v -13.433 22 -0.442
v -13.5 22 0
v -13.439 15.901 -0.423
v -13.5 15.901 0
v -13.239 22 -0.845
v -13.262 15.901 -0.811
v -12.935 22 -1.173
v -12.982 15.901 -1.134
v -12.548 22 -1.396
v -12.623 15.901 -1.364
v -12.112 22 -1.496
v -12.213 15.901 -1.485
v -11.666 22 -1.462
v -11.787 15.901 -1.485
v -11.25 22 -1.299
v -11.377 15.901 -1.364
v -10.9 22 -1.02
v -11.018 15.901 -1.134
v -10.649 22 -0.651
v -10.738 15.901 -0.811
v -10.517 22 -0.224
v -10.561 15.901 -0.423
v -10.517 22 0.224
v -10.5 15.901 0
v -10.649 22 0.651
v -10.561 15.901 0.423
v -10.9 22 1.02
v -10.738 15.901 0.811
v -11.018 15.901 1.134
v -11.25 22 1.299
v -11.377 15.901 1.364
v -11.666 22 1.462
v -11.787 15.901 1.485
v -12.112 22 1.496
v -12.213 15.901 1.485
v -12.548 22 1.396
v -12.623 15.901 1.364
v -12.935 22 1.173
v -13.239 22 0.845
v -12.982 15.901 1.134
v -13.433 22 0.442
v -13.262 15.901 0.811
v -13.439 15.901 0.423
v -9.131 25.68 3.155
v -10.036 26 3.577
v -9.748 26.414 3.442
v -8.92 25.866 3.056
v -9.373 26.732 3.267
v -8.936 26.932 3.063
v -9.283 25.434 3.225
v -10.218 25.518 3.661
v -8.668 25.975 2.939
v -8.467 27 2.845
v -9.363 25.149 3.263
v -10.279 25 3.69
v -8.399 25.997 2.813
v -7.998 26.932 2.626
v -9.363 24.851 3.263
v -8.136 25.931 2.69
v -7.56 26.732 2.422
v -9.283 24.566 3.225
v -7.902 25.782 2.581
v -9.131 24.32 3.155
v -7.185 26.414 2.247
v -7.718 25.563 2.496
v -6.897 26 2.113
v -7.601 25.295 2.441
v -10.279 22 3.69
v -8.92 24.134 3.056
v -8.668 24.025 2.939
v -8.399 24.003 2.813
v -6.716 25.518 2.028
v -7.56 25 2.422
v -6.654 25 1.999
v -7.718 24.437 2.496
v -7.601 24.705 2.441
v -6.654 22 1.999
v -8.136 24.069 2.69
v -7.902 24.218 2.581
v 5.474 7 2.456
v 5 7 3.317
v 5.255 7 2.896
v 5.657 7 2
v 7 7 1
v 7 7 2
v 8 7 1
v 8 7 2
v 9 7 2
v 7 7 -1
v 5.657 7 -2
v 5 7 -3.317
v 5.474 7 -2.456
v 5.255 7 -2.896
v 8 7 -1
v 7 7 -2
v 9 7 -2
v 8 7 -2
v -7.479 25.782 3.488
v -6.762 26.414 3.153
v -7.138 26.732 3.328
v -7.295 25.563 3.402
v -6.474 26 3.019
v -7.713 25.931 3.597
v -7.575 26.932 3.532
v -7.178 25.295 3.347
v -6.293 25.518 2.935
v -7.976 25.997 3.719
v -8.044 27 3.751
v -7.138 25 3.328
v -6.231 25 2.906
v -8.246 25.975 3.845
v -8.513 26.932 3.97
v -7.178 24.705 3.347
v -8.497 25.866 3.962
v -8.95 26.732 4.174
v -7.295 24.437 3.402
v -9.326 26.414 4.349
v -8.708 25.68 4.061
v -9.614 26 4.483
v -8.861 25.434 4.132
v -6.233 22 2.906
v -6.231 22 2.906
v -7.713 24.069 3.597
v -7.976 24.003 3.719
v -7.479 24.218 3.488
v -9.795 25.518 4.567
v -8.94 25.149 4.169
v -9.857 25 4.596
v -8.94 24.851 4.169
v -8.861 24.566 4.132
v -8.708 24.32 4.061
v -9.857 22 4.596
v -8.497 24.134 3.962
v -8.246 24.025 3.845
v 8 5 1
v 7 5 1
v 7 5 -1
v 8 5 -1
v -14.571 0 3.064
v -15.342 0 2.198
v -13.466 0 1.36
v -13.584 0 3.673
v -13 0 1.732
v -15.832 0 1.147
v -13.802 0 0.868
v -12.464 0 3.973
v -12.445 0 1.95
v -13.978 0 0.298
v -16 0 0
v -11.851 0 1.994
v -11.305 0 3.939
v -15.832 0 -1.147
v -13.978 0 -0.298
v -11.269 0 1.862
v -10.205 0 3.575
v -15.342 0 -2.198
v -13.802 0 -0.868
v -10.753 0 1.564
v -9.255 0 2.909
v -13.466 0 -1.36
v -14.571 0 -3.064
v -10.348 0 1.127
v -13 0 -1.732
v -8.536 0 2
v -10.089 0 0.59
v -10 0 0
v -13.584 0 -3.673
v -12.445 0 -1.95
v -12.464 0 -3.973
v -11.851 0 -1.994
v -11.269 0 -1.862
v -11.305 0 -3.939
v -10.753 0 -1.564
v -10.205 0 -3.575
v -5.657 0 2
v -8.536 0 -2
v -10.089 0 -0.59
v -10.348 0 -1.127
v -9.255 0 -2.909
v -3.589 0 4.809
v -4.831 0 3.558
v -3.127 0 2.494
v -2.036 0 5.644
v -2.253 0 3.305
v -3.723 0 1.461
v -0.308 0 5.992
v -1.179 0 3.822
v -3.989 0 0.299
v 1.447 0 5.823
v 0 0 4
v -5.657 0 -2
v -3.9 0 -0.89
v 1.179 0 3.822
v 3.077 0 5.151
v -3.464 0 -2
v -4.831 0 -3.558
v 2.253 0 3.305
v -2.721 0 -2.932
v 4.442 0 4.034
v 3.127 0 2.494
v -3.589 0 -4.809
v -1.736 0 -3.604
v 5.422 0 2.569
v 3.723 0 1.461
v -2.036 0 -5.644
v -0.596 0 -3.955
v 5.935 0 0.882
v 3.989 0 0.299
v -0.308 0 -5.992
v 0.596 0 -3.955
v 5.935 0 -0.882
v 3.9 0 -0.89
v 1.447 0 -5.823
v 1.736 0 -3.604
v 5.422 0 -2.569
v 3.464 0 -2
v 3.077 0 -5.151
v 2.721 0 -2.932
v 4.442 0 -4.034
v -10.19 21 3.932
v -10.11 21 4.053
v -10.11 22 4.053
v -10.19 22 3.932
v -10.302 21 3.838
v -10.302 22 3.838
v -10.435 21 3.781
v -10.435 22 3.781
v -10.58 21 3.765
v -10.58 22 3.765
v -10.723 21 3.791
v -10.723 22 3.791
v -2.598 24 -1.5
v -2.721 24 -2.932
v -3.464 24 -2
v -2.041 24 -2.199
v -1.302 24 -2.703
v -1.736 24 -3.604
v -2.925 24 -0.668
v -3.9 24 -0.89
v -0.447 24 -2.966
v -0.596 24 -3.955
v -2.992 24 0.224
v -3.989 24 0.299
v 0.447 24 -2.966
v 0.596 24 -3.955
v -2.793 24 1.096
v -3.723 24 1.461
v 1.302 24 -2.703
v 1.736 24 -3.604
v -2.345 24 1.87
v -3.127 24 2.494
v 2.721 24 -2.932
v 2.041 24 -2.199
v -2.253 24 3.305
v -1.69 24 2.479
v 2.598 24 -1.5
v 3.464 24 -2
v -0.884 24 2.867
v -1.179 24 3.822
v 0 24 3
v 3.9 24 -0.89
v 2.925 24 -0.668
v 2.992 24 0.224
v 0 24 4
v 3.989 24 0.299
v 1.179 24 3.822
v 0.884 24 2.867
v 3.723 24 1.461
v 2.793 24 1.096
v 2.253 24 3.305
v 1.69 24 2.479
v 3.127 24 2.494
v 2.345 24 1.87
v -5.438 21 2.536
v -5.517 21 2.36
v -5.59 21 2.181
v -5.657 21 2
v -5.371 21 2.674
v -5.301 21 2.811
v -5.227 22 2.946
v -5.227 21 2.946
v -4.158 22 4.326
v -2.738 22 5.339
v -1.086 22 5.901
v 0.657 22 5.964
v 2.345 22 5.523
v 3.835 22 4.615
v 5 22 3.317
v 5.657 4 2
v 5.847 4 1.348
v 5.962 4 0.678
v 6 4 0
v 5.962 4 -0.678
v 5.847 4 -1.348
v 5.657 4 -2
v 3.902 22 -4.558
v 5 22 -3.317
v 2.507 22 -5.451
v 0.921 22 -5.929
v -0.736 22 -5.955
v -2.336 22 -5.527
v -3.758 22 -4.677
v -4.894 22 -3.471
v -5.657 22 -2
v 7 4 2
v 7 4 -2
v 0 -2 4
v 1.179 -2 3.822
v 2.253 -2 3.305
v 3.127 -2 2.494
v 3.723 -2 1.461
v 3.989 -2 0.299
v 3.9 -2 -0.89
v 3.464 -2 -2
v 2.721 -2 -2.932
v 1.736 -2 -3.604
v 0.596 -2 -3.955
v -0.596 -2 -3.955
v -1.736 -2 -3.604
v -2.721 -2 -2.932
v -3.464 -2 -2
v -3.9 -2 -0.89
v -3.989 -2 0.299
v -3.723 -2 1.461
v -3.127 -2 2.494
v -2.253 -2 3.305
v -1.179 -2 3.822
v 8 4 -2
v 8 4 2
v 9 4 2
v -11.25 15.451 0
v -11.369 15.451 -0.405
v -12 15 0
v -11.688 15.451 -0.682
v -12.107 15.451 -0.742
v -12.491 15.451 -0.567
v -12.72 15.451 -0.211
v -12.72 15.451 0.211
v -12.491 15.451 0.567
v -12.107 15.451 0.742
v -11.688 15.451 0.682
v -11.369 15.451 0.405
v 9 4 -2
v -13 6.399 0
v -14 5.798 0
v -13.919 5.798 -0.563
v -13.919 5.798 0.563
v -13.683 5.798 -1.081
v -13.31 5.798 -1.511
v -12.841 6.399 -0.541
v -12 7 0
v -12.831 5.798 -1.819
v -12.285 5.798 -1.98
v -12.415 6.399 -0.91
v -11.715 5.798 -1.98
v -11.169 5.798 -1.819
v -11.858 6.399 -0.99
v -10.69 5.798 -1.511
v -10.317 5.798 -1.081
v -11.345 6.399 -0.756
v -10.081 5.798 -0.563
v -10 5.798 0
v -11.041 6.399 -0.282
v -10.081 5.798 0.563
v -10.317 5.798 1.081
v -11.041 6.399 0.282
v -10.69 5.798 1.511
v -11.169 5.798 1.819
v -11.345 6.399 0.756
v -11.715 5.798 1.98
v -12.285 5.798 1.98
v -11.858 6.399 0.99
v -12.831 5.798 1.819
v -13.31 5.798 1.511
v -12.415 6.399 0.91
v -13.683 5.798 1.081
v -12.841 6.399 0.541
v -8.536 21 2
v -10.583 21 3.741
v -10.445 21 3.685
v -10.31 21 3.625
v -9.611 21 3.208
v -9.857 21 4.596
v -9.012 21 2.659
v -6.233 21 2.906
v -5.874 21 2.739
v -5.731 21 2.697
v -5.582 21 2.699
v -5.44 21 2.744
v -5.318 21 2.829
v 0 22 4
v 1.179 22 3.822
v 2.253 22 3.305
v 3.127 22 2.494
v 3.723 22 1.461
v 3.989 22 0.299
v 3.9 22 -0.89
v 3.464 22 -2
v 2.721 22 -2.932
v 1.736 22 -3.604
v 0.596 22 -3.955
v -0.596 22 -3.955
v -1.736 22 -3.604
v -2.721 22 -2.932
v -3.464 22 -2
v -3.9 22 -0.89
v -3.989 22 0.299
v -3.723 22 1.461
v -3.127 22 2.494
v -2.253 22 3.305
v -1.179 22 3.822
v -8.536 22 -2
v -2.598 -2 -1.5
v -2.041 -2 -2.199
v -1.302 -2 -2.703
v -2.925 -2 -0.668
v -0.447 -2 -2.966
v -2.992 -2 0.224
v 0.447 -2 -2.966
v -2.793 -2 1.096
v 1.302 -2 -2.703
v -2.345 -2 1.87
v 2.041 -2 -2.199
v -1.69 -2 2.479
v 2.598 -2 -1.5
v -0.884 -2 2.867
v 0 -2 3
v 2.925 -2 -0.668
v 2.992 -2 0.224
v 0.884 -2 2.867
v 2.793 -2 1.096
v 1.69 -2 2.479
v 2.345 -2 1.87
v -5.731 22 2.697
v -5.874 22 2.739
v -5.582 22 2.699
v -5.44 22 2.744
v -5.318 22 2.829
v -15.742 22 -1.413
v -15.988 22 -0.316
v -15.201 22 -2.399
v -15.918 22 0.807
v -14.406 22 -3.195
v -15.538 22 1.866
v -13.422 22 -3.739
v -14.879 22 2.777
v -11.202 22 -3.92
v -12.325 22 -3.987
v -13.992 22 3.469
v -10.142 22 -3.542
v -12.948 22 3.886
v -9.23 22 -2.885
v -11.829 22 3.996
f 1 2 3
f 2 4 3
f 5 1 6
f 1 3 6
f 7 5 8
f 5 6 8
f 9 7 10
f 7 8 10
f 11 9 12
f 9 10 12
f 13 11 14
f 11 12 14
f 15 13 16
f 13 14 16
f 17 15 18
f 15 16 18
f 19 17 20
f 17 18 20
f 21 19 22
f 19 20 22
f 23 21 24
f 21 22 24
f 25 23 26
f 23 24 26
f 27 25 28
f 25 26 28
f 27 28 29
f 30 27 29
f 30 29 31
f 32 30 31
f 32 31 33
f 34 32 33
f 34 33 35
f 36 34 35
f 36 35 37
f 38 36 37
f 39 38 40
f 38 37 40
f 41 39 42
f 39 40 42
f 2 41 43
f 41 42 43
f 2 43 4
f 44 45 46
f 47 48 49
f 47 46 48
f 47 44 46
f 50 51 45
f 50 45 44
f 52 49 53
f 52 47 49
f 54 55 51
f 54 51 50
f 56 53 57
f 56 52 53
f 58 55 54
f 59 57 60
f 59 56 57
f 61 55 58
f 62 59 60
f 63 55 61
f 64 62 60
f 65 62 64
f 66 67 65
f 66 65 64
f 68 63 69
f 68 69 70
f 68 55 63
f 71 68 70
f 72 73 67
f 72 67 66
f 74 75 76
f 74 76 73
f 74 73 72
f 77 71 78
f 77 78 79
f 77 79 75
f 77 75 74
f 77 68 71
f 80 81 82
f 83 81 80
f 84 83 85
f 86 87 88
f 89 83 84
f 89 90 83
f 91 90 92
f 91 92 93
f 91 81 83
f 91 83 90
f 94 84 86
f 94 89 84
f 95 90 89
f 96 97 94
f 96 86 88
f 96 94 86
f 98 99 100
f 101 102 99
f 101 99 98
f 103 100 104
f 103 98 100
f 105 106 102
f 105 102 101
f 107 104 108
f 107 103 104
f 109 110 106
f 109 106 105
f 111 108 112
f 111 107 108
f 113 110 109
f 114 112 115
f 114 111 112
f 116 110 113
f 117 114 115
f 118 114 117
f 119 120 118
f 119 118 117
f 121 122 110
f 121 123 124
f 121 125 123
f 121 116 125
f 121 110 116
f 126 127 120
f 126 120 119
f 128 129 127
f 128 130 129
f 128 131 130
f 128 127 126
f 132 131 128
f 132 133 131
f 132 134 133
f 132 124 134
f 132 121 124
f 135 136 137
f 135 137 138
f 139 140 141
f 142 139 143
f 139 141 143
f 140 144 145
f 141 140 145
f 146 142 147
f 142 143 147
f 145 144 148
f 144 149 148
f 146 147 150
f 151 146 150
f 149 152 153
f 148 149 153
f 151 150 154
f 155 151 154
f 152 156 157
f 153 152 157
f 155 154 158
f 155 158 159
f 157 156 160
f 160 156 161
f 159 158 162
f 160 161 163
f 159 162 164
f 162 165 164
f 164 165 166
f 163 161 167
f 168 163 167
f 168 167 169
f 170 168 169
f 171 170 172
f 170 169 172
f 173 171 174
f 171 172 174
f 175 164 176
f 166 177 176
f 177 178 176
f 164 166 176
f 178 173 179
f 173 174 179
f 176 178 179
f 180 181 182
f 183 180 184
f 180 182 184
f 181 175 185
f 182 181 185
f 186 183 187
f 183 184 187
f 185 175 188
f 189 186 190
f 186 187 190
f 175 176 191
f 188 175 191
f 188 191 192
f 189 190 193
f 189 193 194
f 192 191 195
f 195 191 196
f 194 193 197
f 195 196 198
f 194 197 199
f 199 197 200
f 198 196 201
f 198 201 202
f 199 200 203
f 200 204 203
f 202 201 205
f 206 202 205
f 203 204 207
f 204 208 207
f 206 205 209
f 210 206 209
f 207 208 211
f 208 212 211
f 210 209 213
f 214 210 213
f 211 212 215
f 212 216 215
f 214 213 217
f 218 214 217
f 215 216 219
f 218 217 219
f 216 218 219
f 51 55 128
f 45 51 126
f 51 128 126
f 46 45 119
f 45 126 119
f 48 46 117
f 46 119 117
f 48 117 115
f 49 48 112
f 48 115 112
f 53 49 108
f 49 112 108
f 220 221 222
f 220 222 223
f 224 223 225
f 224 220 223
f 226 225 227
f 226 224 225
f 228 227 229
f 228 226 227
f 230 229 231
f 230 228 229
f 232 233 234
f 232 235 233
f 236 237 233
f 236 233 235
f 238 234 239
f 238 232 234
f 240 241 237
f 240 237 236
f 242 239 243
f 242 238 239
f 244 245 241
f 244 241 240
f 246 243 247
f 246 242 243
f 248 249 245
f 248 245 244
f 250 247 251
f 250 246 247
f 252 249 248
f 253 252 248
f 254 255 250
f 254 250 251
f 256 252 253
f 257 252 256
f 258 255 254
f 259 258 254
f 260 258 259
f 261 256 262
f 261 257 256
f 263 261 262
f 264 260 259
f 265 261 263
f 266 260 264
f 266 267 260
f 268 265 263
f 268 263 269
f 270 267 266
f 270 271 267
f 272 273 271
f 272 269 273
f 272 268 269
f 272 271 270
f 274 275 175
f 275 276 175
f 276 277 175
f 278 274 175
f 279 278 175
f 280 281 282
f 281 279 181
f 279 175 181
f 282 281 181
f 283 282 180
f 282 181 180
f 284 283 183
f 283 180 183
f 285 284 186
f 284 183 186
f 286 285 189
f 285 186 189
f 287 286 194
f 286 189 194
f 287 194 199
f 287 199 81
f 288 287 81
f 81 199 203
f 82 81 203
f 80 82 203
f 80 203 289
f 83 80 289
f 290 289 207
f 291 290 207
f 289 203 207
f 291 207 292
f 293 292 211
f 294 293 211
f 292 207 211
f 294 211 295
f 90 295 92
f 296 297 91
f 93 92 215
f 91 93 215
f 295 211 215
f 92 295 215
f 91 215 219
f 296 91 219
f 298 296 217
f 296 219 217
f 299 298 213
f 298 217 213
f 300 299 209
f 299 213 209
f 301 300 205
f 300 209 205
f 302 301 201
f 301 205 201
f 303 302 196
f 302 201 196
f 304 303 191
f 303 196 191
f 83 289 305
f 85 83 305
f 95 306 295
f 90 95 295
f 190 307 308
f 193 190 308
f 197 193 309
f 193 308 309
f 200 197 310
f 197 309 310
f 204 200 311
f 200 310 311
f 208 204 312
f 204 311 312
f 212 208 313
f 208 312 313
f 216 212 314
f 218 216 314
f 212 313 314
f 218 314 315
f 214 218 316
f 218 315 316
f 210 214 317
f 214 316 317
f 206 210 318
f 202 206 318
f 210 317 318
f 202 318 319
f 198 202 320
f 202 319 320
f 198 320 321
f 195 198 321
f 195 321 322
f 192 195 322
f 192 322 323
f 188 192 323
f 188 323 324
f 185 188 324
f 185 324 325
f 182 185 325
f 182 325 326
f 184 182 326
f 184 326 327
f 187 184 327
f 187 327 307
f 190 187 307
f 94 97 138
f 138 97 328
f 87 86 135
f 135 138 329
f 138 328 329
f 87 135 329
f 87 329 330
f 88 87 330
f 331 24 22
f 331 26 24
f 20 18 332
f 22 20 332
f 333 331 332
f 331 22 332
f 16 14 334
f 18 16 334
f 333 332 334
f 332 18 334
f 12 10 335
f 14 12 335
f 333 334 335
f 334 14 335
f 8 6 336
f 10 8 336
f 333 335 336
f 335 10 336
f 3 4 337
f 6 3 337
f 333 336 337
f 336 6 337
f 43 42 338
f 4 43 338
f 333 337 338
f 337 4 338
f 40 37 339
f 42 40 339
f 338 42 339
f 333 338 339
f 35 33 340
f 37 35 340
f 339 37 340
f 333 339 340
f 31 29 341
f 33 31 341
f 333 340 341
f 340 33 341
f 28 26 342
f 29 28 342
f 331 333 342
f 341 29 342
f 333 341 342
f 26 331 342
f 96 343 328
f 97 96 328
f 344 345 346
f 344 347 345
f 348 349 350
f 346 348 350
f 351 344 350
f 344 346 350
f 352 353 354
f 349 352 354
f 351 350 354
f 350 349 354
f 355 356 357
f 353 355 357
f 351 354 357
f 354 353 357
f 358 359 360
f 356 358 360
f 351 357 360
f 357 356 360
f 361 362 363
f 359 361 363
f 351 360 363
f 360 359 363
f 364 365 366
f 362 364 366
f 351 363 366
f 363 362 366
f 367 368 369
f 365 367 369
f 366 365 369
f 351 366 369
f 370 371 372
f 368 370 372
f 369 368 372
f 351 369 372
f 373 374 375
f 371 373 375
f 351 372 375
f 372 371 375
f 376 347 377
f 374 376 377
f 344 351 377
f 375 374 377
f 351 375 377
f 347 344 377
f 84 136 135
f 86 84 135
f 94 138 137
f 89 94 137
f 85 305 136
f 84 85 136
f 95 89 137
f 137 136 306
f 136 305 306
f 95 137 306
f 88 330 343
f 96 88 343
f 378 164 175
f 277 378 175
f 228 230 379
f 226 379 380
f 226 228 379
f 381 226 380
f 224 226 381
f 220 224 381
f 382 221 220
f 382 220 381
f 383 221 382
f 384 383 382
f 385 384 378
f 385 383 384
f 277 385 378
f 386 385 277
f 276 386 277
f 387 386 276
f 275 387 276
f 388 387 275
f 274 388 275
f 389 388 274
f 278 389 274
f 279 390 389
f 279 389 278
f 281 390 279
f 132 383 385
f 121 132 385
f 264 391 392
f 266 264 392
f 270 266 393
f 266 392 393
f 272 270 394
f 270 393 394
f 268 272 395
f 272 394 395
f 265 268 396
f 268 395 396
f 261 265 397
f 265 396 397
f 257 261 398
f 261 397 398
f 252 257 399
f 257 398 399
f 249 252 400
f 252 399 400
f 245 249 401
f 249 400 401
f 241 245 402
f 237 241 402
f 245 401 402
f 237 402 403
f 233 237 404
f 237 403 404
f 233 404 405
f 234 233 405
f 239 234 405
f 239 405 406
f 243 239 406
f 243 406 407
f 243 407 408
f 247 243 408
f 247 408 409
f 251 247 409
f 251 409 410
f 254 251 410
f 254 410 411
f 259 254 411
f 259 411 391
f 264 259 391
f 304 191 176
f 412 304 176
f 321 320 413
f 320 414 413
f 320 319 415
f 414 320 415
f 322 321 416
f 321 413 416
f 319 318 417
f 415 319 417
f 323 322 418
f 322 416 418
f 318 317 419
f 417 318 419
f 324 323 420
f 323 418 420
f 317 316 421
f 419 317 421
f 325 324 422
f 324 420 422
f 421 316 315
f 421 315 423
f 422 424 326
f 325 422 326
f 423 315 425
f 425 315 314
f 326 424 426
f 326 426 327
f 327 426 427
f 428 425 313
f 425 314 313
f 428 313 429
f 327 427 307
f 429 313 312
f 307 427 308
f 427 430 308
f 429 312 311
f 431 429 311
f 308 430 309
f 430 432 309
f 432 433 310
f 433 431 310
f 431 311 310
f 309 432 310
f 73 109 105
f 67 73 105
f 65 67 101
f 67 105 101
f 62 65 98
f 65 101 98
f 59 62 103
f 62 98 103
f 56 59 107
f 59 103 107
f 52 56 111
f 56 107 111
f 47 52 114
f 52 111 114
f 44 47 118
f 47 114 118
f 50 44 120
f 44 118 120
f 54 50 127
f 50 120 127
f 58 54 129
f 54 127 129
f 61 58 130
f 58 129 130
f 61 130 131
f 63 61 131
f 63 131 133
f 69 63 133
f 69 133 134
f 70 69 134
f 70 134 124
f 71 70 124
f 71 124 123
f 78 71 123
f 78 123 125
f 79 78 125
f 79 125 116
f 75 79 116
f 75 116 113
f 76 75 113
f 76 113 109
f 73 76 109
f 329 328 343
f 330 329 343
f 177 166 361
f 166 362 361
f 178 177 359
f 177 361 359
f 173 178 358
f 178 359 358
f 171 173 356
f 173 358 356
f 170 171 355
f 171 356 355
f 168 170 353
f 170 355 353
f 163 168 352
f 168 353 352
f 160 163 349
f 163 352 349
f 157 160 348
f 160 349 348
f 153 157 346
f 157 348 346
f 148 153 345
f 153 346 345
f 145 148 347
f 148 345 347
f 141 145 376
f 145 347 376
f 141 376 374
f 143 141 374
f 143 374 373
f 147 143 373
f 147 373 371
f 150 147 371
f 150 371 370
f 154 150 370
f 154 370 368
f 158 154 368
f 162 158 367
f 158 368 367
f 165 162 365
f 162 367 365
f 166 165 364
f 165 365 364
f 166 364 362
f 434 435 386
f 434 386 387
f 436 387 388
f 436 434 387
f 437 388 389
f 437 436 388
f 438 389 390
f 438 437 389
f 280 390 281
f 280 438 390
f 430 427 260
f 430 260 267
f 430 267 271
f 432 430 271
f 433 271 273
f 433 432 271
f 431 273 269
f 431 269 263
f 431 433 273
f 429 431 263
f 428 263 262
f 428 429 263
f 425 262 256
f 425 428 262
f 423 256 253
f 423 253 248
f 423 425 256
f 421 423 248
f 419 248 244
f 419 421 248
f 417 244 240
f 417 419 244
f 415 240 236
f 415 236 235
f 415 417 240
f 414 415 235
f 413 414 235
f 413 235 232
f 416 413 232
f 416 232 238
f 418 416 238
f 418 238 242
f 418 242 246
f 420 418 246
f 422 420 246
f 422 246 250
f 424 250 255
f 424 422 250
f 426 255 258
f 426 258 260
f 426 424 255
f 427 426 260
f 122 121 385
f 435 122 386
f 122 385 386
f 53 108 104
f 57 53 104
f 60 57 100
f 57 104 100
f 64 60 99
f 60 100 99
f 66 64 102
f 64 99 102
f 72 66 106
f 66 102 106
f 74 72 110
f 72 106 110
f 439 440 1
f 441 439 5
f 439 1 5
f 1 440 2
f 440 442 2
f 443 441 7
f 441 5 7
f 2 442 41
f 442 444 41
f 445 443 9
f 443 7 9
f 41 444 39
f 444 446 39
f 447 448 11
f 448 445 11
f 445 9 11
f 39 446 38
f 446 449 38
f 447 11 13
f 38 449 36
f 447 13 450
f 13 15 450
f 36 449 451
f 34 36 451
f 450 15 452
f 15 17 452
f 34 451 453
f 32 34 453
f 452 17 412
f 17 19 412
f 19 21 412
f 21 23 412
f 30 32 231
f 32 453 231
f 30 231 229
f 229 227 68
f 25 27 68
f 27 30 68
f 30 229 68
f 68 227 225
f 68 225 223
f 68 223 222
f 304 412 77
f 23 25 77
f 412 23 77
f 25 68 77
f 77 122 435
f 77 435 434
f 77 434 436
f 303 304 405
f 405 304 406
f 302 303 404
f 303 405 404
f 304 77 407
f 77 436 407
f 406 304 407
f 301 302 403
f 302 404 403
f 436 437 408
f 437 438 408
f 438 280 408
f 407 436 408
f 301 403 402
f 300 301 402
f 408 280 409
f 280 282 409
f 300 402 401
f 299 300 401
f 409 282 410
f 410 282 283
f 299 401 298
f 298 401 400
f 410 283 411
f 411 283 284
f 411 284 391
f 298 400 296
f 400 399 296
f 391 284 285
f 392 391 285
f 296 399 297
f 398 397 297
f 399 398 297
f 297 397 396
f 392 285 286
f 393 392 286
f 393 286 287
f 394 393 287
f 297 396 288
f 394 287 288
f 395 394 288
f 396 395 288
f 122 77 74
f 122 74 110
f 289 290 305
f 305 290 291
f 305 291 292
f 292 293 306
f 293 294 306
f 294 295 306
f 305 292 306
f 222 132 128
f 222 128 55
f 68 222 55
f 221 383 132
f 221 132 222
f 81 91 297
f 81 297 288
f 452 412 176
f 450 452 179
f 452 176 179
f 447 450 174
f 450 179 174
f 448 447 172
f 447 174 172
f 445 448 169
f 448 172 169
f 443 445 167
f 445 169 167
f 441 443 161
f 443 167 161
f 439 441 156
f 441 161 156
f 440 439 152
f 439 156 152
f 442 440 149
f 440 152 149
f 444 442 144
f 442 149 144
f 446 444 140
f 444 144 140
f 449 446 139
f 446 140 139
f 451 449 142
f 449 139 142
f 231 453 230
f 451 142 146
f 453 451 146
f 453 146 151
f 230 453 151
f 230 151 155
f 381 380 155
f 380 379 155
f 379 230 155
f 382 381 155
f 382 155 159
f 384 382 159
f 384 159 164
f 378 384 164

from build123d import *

# Parameters (mm, degrees)
SKETCH1_R                 = 4
BOSS_EXTRUDE1_DEPTH       = 22
BOSS_EXTRUDE2_DEPTH       = 24
BOSS_EXTRUDE2_DEPTH_BACK  = 2
SKETCH1_3_R               = 4
SKETCH1_3_R_2             = 3
CUT_EXTRUDE1_DEPTH        = 18
BOSS_EXTRUDE3_DEPTH       = 3
SKETCH3_W                 = 1
SKETCH3_H                 = 1
CUT_EXTRUDE2_DEPTH        = 2
BOSS_EXTRUDE7_START       = -1
BOSS_EXTRUDE7_DEPTH       = 1
BOSS_EXTRUDE8_DEPTH       = 5
CUT_EXTRUDE8_REACH        = 33.953
SKETCH8_R                 = 1
FILLET1_R                 = 0.5
F_4_0MM_DOWEL_HOLE1_D     = 4
F_4_0MM_DOWEL_HOLE1_DEPTH = 5.798278762
F_4_0MM_DOWEL_HOLE1_TIP   = 1.201721238
F_3_0MM_DOWEL_HOLE1_D     = 3
F_3_0MM_DOWEL_HOLE1_DEPTH = 6.098709071
F_3_0MM_DOWEL_HOLE1_TIP   = 0.901290929


with BuildPart() as part:
    # Sketch1 → Boss-Extrude1 (new body)
    with BuildSketch(Plane(origin=(0, 0, 0), x_dir=(1, 0, 0), z_dir=(0, 1, 0))):
        with BuildLine():
            Line((-5.656854249, 2), (-8.535898385, 2))
            ThreePointArc((-8.535898385, 2), (-16, 0), (-8.535898385, -2))
            Line((-8.535898385, -2), (-5.656854249, -2))
            ThreePointArc((-5.656854249, -2), (6, 0), (-5.656854249, 2))
        make_face()
        with Locations(Location((0, 0, 0), (0, 0, 270))):
            Circle(SKETCH1_R, mode=Mode.SUBTRACT)
    extrude(amount=BOSS_EXTRUDE1_DEPTH)

    # Sketch1<3> → Boss-Extrude2 (add, two sides: drawn at the far end of the back side and taken through both)
    with BuildSketch(Plane(origin=(0, 0, 0), x_dir=(1, 0, 0), z_dir=(0, 1, 0)).offset(-BOSS_EXTRUDE2_DEPTH_BACK)):
        with Locations(Location((0, 0, 0), (0, 0, 270))):
            Circle(SKETCH1_3_R)
        with Locations(Location((0, 0, 0), (0, 0, 270))):
            Circle(SKETCH1_3_R_2, mode=Mode.SUBTRACT)
    extrude(amount=BOSS_EXTRUDE2_DEPTH + BOSS_EXTRUDE2_DEPTH_BACK)

    # Sketch2 → Cut-Extrude1 (cut)
    with BuildSketch(Plane(origin=(0, 4, 0), x_dir=(1, 0, 0), z_dir=(0, 1, 0))):
        with BuildLine():
            ThreePointArc((5.656854249, 2), (5.368939451, 2.678523692), (5, 3.31662479))
            Line((5, 3.31662479), (5, 0))
            Line((5, 0), (6, 0))
            ThreePointArc((6, 0), (5.913591358, 1.014611872), (5.656854249, 2))
        make_face()
        with BuildLine():
            Line((6, 0), (5, 0))
            Line((5, 0), (5, -3.31662479))
            ThreePointArc((5, -3.31662479), (5.368939451, -2.678523692), (5.656854249, -2))
            ThreePointArc((5.656854249, -2), (5.913591358, -1.014611872), (6, 0))
        make_face()
    extrude(amount=CUT_EXTRUDE1_DEPTH, mode=Mode.SUBTRACT)

    # Sketch2<3> → Boss-Extrude3 (add)
    with BuildSketch(Plane(origin=(0, 4, 0), x_dir=(1, 0, 0), z_dir=(0, 1, 0))):
        with BuildLine():
            Line((5, 3.31662479), (5, -3.31662479))
            ThreePointArc((5, -3.31662479), (5.368939451, -2.678523692), (5.656854249, -2))
            Line((5.656854249, -2), (7, -2))
            Line((7, -2), (7, -1))
            Line((7, -1), (8, -1))
            Line((8, -1), (8, -2))
            Line((8, -2), (9, -2))
            Line((9, -2), (9, 2))
            Line((9, 2), (8, 2))
            Line((8, 2), (8, 1))
            Line((8, 1), (7, 1))
            Line((7, 1), (7, 2))
            Line((7, 2), (5.656854249, 2))
            ThreePointArc((5.656854249, 2), (5.368939451, 2.678523692), (5, 3.31662479))
        make_face()
    extrude(amount=BOSS_EXTRUDE3_DEPTH)

    # Sketch3 → Cut-Extrude2 (cut)
    with BuildSketch(Plane.XY.offset(1)):
        with Locations((7.5, 4.5)):
            Rectangle(SKETCH3_W, SKETCH3_H)
    extrude(amount=-CUT_EXTRUDE2_DEPTH, mode=Mode.SUBTRACT)

    # Sketch6 → Boss-Extrude7 (add)
    with BuildSketch(Plane(origin=(0, 22, 0), x_dir=(1, 0, 0), z_dir=(0, 1, 0)).offset(BOSS_EXTRUDE7_START)):
        Polygon((-9.856725658, -4.596266659), (-6.232597162, -2.906307787), (-6.655215424, -2), (-10.27934392, -3.689958872), align=None)
        Polygon((-6.232597162, -2.906307787), (-5.412549479, -2.523913272), (-5.83516774, -1.617605485), (-6.655215424, -2), align=None)
        with BuildLine():
            Line((-10.27934392, -3.689958872), (-6.655215424, -2))
            Line((-6.655215424, -2), (-8.535898385, -2))
            ThreePointArc((-8.535898385, -2), (-9.29763917, -2.949109347), (-10.309526953, -3.625231148))
            Line((-10.309526953, -3.625231148), (-10.27934392, -3.689958872))
        make_face()
    extrude(amount=BOSS_EXTRUDE7_DEPTH)

    # Sketch7 → Boss-Extrude8 (add)
    with BuildSketch(Plane(origin=(0, 22, 0), x_dir=(1, 0, 0), z_dir=(0, 1, 0))):
        Polygon((-10.27934392, -3.689958872), (-6.654112772, -1.999485825), (-6.23149451, -2.905793612), (-9.856725658, -4.596266659), align=None)
    extrude(amount=BOSS_EXTRUDE8_DEPTH)

    # Sketch8 → Cut-Extrude8 (cut, up to next)
    with BuildSketch(Plane(origin=(0, 0, 0), x_dir=(0.9063077870366509, 0, -0.42261826174069733), z_dir=(0.42261826174069733, 0, 0.9063077870366509)), mode=Mode.PRIVATE) as cut_extrude8_sk1:
        with BuildLine():
            ThreePointArc((-10.875693444, 25), (-10.289907007, 26.414213562), (-8.875693444, 27))
            Line((-8.875693444, 27), (-10.875693444, 27))
            Line((-10.875693444, 27), (-10.875693444, 25))
        make_face()
    cut_extrude8_tool1 = extrude(cut_extrude8_sk1.sketch, amount=-CUT_EXTRUDE8_REACH, mode=Mode.PRIVATE) & part.part
    # Sketch8 → Cut-Extrude8 (cut, up to next)
    with BuildSketch(Plane(origin=(0, 0, 0), x_dir=(0.9063077870366509, 0, -0.42261826174069733), z_dir=(0.42261826174069733, 0, 0.9063077870366509)), mode=Mode.PRIVATE) as cut_extrude8_sk2:
        with BuildLine():
            ThreePointArc((-8.875693444, 27), (-7.461479882, 26.414213562), (-6.875693444, 25))
            Line((-6.875693444, 25), (-6.875693444, 27))
            Line((-6.875693444, 27), (-8.875693444, 27))
        make_face()
    cut_extrude8_tool2 = extrude(cut_extrude8_sk2.sketch, amount=-CUT_EXTRUDE8_REACH, mode=Mode.PRIVATE) & part.part
    # Sketch8 → Cut-Extrude8 (cut, up to next)
    with BuildSketch(Plane(origin=(0, 0, 0), x_dir=(0.9063077870366509, 0, -0.42261826174069733), z_dir=(0.42261826174069733, 0, 0.9063077870366509)), mode=Mode.PRIVATE) as cut_extrude8_sk3:
        with Locations((-8.875693444, 25)):
            Circle(SKETCH8_R)
    cut_extrude8_tool3 = extrude(cut_extrude8_sk3.sketch, amount=-CUT_EXTRUDE8_REACH, mode=Mode.PRIVATE) & part.part
    add(cut_extrude8_tool1.solids().sort_by_distance((-9.451845, 26.553264, 4.407468))[0], mode=Mode.SUBTRACT)
    add(cut_extrude8_tool2.solids().sort_by_distance((-6.636375, 26.553264, 3.094592))[0], mode=Mode.SUBTRACT)
    add(cut_extrude8_tool3.solids().sort_by_distance((-8.04411, 25, 3.75103))[0], mode=Mode.SUBTRACT)

    # Fillet1
    # the kernel refuses this fillet: 0.5 mm, written as the material it adds along each edge
    with BuildSketch(Plane(origin=(-5.437846722, 22, 2.53570957), x_dir=(0.4571889357830061, 0, 0.8893695952738672), z_dir=(0, -1, 0))) as fillet1_piece_1:
        with BuildLine():
            CenterArc((0.481125753, 0.499629492), FILLET1_R, 182.205862892, 85.588274215)
            Line((-0.018503738, 0.480384461), (0, 0))
            ThreePointArc((0, 0), (0.230940361, 0.004446102), (0.461880723, 0))
        make_face()
    extrude(amount=1)
    with BuildSketch(Plane(origin=(-10.309526953, 21, 3.625231148), x_dir=(-0.9284189548945215, 0, 0.3715349838071298), z_dir=(0, 1, 0))) as fillet1_piece_2:
        with BuildLine():
            CenterArc((0.472954925, 0.499225399), FILLET1_R, 183.189685104, 83.620629792)
            Line((-0.026270474, 0.471404521), (0, 0))
            ThreePointArc((0, 0), (0.222567024, 0.00619681), (0.445134047, 0))
        make_face()
    extrude(amount=1)

    # Ø4.0mm Dowel Hole1
    with Locations(Plane(origin=(0, 0, 0), x_dir=(-1, 0, 0), z_dir=(0, -1, 0))):
        with Locations((12, 0)):
            Hole(F_4_0MM_DOWEL_HOLE1_D / 2, depth=F_4_0MM_DOWEL_HOLE1_DEPTH)
            with Locations((0, 0, -(F_4_0MM_DOWEL_HOLE1_DEPTH + F_4_0MM_DOWEL_HOLE1_TIP / 2))):  # 118° drill point
                Cone(0, F_4_0MM_DOWEL_HOLE1_D / 2, F_4_0MM_DOWEL_HOLE1_TIP, mode=Mode.SUBTRACT)

    # Ø3.0mm Dowel Hole1
    with Locations(Plane(origin=(0, 22, 0), x_dir=(1, 0, 0), z_dir=(0, 1, 0))):
        with Locations((-12, 0)):
            Hole(F_3_0MM_DOWEL_HOLE1_D / 2, depth=F_3_0MM_DOWEL_HOLE1_DEPTH)
            with Locations((0, 0, -(F_3_0MM_DOWEL_HOLE1_DEPTH + F_3_0MM_DOWEL_HOLE1_TIP / 2))):  # 118° drill point
                Cone(0, F_3_0MM_DOWEL_HOLE1_D / 2, F_3_0MM_DOWEL_HOLE1_TIP, mode=Mode.SUBTRACT)


solid = part.part
